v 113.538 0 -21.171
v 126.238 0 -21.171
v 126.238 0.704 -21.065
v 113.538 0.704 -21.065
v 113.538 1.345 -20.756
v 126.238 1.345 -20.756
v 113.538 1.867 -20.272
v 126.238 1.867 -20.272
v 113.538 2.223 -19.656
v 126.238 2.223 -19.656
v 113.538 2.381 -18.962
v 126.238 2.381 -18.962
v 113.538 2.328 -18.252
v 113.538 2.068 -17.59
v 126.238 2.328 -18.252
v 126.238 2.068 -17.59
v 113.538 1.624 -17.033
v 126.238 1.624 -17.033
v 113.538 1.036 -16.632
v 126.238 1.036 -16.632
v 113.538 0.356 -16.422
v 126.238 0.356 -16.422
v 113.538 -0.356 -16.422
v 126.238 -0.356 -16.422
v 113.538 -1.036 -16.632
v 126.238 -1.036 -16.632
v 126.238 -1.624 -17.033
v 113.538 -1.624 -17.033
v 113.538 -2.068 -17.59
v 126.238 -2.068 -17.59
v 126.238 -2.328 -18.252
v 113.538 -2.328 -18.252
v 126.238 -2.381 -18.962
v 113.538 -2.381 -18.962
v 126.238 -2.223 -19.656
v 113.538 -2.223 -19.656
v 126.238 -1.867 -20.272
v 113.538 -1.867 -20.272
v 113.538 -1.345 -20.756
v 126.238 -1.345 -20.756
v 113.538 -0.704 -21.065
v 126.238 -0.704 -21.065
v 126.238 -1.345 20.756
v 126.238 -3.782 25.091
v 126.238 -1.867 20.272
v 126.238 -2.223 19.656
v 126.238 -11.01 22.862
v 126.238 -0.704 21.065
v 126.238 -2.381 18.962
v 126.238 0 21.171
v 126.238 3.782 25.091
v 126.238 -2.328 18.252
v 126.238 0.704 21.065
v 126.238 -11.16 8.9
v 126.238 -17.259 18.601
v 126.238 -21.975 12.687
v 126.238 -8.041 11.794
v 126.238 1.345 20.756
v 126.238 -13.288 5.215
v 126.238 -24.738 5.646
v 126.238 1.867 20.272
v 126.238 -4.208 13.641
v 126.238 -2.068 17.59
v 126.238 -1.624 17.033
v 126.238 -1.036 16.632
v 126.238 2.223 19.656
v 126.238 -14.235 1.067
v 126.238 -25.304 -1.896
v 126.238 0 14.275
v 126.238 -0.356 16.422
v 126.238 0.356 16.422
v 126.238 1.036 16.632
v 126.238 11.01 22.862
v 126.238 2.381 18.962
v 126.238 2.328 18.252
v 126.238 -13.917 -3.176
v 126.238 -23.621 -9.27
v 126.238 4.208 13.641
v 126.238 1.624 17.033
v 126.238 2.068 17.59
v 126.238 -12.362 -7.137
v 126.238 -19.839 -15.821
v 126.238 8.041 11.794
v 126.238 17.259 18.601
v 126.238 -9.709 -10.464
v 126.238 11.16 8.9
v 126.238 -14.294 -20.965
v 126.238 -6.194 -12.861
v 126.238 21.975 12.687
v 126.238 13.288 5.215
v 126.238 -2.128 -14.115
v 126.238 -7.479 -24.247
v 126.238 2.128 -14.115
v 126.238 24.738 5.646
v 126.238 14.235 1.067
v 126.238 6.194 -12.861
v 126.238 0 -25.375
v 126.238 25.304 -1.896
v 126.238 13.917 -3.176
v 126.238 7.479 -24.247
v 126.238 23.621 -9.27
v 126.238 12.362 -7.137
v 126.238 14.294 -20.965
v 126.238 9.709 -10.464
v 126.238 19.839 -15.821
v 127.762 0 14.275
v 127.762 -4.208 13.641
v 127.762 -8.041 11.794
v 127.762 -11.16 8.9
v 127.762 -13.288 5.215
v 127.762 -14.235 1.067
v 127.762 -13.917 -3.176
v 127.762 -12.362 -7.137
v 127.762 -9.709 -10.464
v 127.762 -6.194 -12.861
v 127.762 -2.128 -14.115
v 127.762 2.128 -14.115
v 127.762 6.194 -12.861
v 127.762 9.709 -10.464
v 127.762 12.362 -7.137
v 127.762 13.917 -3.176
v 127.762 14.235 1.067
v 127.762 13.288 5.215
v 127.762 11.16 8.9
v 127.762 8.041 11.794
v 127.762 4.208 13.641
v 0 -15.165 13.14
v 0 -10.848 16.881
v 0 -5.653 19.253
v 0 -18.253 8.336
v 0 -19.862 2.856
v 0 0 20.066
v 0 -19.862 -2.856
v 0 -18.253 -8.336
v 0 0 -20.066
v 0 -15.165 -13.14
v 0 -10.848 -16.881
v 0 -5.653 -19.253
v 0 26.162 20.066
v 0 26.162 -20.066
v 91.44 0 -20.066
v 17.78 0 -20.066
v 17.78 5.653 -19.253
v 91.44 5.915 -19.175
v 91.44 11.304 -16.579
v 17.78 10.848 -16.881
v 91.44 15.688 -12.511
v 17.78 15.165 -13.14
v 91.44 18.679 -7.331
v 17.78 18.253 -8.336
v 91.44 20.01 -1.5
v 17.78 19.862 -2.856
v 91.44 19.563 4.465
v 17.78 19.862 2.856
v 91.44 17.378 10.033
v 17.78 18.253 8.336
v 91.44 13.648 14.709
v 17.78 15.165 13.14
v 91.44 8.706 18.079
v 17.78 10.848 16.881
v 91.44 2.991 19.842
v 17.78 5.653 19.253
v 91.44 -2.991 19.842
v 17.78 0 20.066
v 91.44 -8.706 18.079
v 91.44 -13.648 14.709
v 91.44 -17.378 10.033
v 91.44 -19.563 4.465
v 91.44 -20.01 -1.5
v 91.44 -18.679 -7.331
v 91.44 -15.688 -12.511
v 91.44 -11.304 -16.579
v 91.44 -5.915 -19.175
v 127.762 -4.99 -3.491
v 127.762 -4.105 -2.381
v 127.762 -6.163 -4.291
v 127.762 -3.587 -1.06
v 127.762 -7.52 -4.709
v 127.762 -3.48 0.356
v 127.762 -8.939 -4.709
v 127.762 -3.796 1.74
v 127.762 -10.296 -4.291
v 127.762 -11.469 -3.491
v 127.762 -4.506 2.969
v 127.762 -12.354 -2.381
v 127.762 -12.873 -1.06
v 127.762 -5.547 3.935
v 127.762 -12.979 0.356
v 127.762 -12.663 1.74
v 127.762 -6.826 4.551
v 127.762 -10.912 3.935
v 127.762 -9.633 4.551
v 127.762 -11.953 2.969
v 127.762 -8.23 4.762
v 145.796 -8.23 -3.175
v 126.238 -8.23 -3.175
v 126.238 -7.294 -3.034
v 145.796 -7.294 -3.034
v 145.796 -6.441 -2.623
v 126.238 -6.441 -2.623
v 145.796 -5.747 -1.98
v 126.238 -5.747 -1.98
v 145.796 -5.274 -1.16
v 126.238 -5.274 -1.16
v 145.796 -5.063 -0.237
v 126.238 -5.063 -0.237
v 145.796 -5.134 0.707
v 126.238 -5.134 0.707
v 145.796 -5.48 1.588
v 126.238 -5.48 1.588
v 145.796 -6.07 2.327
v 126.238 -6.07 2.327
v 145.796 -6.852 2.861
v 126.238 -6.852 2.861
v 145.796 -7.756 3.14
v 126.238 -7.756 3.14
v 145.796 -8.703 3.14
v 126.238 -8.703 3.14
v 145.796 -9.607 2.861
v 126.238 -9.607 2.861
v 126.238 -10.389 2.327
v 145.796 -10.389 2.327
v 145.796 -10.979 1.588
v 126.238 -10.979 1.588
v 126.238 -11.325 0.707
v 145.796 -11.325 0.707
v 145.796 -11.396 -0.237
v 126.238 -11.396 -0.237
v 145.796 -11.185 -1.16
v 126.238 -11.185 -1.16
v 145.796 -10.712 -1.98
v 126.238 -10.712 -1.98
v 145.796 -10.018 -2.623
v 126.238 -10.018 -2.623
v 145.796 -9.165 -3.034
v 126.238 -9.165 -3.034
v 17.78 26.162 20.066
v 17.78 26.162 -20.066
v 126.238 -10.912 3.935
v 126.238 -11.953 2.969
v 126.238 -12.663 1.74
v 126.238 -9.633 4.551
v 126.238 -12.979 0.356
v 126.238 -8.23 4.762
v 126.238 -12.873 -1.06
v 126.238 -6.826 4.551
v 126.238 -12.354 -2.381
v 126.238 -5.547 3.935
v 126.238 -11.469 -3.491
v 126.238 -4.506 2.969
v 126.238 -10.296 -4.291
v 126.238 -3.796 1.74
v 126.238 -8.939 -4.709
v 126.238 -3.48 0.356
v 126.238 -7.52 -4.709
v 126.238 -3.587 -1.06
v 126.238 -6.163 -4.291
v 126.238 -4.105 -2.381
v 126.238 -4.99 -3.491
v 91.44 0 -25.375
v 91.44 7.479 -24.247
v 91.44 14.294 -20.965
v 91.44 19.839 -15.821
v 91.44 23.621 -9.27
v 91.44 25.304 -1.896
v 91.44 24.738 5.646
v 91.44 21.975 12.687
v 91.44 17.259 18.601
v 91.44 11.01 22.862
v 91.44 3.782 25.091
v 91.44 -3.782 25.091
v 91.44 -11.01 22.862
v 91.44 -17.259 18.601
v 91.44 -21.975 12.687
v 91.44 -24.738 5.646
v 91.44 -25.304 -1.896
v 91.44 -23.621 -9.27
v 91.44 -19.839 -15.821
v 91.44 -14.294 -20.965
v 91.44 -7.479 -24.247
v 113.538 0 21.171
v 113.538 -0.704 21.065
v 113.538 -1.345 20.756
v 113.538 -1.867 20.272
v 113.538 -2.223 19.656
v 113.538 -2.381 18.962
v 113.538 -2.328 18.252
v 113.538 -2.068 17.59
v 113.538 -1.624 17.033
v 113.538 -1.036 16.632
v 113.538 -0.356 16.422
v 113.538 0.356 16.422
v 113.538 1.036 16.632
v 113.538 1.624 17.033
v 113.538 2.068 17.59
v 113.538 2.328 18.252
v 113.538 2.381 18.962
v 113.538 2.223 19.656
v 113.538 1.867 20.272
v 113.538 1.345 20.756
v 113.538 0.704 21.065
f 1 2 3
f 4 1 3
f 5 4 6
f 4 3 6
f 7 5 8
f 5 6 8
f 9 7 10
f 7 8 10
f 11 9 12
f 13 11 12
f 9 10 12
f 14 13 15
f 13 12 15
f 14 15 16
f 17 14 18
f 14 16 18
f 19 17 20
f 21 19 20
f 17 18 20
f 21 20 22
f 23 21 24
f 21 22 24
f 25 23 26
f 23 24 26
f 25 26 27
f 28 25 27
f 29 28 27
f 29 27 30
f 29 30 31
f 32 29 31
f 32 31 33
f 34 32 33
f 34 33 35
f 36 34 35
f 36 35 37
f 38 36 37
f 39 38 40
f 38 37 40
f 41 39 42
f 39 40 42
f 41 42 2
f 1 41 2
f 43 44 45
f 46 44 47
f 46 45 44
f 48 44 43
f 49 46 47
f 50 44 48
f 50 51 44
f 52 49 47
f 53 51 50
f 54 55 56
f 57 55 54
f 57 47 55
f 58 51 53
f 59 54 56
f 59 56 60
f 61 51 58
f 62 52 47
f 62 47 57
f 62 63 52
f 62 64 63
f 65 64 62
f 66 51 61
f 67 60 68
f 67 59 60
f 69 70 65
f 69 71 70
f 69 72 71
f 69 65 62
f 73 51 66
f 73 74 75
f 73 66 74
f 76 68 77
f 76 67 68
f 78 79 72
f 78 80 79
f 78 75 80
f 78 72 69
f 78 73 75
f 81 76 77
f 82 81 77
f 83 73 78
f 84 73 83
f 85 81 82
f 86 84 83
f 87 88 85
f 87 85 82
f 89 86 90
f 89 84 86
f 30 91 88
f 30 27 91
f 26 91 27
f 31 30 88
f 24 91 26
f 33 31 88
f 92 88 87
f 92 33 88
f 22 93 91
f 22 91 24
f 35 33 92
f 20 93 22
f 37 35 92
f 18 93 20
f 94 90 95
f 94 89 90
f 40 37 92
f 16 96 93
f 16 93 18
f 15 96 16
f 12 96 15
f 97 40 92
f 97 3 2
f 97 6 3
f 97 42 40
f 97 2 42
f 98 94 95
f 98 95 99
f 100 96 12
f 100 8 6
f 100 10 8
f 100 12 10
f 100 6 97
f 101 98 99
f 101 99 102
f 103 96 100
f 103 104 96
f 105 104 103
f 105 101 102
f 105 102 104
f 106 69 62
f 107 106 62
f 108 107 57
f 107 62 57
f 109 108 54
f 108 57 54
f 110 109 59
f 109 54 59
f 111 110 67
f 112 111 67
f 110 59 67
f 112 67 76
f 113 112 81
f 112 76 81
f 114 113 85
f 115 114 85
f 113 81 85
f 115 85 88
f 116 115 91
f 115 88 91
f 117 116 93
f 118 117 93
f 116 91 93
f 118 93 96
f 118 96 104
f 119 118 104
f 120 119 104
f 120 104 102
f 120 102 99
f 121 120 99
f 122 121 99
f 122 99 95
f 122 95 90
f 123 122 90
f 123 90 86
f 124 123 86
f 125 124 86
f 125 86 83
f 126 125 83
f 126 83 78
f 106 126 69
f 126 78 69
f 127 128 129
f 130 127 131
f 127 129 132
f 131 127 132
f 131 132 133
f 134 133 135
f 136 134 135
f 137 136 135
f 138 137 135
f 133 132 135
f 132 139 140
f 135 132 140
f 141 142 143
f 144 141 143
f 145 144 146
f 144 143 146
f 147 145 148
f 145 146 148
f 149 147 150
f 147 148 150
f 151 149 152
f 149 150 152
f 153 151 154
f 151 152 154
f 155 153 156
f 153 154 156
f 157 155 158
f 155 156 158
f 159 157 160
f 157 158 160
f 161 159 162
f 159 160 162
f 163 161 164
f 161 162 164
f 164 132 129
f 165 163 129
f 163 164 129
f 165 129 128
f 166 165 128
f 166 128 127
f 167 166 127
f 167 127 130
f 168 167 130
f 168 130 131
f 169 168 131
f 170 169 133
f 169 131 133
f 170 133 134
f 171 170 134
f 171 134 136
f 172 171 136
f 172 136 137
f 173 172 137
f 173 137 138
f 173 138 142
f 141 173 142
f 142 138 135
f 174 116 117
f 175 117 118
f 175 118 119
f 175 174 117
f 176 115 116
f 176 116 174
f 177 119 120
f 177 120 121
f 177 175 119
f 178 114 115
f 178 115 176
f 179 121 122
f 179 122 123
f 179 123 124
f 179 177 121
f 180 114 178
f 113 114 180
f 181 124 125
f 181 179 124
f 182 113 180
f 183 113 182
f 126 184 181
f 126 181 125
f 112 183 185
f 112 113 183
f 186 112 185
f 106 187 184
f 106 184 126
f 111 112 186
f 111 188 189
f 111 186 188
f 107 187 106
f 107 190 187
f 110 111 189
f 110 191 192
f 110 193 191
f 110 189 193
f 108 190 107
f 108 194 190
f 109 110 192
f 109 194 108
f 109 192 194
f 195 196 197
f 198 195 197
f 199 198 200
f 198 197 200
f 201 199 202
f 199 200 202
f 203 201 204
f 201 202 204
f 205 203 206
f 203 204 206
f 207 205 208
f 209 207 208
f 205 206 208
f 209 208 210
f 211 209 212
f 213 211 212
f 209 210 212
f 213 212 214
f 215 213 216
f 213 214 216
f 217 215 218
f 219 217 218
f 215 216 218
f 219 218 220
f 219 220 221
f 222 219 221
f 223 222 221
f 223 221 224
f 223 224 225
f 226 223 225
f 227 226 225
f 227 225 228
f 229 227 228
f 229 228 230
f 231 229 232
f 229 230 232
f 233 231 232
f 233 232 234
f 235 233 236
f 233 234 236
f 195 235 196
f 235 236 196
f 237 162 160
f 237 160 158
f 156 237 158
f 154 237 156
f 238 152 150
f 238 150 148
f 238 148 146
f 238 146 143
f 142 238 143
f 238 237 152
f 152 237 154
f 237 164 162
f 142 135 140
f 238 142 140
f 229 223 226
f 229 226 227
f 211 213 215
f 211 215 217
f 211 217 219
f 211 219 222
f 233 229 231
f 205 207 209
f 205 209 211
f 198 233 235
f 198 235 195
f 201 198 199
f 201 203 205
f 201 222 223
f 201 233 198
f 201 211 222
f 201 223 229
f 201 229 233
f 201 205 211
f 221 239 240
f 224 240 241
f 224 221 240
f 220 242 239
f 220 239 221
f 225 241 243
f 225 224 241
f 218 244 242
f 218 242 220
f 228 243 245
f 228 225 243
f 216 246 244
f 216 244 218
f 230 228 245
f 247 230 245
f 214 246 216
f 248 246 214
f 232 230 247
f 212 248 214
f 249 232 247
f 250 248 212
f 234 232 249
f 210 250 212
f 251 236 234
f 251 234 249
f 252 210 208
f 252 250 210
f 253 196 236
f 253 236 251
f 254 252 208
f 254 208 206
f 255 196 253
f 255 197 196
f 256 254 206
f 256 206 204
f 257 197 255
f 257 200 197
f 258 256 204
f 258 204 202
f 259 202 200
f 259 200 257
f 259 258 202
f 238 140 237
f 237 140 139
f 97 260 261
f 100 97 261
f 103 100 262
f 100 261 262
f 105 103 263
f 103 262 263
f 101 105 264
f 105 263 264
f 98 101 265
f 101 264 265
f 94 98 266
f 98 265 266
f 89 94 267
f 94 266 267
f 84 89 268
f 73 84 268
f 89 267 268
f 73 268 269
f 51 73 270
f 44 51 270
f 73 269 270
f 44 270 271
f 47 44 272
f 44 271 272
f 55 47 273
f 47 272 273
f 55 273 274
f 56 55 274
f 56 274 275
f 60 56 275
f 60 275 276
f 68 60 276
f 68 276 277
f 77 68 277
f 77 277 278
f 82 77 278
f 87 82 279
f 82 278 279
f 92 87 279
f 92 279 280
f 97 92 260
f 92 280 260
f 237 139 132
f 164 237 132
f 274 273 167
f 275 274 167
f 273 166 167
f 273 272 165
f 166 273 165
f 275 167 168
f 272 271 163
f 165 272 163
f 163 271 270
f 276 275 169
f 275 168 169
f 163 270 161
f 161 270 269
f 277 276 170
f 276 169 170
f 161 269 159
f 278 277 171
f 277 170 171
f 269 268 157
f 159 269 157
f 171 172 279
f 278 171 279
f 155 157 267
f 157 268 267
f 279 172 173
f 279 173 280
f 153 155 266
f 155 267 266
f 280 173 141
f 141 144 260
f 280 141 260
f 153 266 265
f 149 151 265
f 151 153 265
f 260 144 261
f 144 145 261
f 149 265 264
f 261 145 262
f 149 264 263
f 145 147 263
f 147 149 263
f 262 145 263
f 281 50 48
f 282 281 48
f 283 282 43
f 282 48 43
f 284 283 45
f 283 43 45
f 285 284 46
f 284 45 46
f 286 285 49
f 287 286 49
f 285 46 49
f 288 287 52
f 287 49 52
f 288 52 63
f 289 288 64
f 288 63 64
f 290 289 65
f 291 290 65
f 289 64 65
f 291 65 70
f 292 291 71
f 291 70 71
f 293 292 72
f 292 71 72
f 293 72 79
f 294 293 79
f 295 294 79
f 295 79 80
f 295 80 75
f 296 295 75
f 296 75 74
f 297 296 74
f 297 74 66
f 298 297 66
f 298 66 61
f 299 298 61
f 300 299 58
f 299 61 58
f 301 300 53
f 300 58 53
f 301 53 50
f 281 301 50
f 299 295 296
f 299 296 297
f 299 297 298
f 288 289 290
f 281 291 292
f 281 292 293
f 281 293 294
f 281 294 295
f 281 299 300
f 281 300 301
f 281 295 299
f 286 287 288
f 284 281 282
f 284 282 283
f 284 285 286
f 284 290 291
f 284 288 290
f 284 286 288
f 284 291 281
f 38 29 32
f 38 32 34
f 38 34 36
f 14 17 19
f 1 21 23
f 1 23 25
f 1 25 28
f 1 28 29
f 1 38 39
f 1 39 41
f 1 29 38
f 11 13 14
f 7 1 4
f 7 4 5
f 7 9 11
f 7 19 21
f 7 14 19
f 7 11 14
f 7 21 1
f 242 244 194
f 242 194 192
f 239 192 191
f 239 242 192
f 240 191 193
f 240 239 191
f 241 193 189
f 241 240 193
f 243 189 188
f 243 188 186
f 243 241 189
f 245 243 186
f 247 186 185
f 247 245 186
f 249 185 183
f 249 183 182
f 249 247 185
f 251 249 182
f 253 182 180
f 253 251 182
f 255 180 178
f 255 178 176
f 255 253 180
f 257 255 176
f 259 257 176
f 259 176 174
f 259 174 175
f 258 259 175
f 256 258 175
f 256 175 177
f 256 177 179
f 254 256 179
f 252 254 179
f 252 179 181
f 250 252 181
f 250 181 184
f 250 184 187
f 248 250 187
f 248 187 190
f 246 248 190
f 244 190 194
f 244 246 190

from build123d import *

# Parameters (mm, degrees)
SKETCH1_R           = 20.066
BOSS_EXTRUDE1_DEPTH = 91.44
BOSS_EXTRUDE2_DEPTH = 17.78
SKETCH3_R           = 25.3746
BOSS_EXTRUDE3_DEPTH = 34.798
SKETCH5_R           = 14.2748
SKETCH5_R_2         = 4.7625
BOSS_EXTRUDE5_DEPTH = 1.524
SKETCH6_R           = 3.175
BOSS_EXTRUDE6_DEPTH = 19.558
SKETCH7_R           = 2.3876
CUT_EXTRUDE1_DEPTH  = 12.7


with BuildPart() as part:
    # Sketch1 → Boss-Extrude1 (new body)
    with BuildSketch(Plane(origin=(0, 0, 0), x_dir=(0, 0, -1), z_dir=(1, 0, 0))):
        Circle(SKETCH1_R)
    extrude(amount=BOSS_EXTRUDE1_DEPTH)

    # Sketch2 → Boss-Extrude2 (add)
    with BuildSketch(Plane.ZY):
        with BuildLine():
            Line((-20.066, 26.162), (20.066, 26.162))
            Line((20.066, 26.162), (20.066, 0))
            ThreePointArc((20.066, 0), (0, -20.066), (-20.066, 0))
            Line((-20.066, 0), (-20.066, 26.162))
        make_face()
    extrude(amount=-BOSS_EXTRUDE2_DEPTH)

    # Sketch3 → Boss-Extrude3 (add)
    with BuildSketch(Plane(origin=(91.44, 0, 0), x_dir=(0, 0, -1), z_dir=(1, 0, 0))):
        Circle(SKETCH3_R)
    extrude(amount=BOSS_EXTRUDE3_DEPTH)

    # Sketch5 → Boss-Extrude5 (add)
    with BuildSketch(Plane(origin=(126.238, 0, 0), x_dir=(0, 0, -1), z_dir=(1, 0, 0))):
        with Locations(Location((0, 0, 0), (0, 0, 180))):
            Circle(SKETCH5_R)
        with Locations(Location((0, -8.2296, 0), (0, 0, 180))):
            Circle(SKETCH5_R_2, mode=Mode.SUBTRACT)
    extrude(amount=BOSS_EXTRUDE5_DEPTH)

    # Sketch6 → Boss-Extrude6 (add)
    with BuildSketch(Plane(origin=(126.238, 0, 0), x_dir=(0, 0, -1), z_dir=(1, 0, 0))):
        with Locations((0, -8.2296)):
            Circle(SKETCH6_R)
    extrude(amount=BOSS_EXTRUDE6_DEPTH)

    # Sketch7 → Cut-Extrude1 (cut)
    with BuildSketch(Plane(origin=(126.238, 0, 0), x_dir=(0, 0, -1), z_dir=(1, 0, 0))):
        with Locations((18.7833, 0)):
            Circle(SKETCH7_R)
        with Locations(Location((-18.7833, 0, 0), (0, 0, 180))):
            Circle(SKETCH7_R)
    extrude(amount=-CUT_EXTRUDE1_DEPTH, mode=Mode.SUBTRACT)


solid = part.part
